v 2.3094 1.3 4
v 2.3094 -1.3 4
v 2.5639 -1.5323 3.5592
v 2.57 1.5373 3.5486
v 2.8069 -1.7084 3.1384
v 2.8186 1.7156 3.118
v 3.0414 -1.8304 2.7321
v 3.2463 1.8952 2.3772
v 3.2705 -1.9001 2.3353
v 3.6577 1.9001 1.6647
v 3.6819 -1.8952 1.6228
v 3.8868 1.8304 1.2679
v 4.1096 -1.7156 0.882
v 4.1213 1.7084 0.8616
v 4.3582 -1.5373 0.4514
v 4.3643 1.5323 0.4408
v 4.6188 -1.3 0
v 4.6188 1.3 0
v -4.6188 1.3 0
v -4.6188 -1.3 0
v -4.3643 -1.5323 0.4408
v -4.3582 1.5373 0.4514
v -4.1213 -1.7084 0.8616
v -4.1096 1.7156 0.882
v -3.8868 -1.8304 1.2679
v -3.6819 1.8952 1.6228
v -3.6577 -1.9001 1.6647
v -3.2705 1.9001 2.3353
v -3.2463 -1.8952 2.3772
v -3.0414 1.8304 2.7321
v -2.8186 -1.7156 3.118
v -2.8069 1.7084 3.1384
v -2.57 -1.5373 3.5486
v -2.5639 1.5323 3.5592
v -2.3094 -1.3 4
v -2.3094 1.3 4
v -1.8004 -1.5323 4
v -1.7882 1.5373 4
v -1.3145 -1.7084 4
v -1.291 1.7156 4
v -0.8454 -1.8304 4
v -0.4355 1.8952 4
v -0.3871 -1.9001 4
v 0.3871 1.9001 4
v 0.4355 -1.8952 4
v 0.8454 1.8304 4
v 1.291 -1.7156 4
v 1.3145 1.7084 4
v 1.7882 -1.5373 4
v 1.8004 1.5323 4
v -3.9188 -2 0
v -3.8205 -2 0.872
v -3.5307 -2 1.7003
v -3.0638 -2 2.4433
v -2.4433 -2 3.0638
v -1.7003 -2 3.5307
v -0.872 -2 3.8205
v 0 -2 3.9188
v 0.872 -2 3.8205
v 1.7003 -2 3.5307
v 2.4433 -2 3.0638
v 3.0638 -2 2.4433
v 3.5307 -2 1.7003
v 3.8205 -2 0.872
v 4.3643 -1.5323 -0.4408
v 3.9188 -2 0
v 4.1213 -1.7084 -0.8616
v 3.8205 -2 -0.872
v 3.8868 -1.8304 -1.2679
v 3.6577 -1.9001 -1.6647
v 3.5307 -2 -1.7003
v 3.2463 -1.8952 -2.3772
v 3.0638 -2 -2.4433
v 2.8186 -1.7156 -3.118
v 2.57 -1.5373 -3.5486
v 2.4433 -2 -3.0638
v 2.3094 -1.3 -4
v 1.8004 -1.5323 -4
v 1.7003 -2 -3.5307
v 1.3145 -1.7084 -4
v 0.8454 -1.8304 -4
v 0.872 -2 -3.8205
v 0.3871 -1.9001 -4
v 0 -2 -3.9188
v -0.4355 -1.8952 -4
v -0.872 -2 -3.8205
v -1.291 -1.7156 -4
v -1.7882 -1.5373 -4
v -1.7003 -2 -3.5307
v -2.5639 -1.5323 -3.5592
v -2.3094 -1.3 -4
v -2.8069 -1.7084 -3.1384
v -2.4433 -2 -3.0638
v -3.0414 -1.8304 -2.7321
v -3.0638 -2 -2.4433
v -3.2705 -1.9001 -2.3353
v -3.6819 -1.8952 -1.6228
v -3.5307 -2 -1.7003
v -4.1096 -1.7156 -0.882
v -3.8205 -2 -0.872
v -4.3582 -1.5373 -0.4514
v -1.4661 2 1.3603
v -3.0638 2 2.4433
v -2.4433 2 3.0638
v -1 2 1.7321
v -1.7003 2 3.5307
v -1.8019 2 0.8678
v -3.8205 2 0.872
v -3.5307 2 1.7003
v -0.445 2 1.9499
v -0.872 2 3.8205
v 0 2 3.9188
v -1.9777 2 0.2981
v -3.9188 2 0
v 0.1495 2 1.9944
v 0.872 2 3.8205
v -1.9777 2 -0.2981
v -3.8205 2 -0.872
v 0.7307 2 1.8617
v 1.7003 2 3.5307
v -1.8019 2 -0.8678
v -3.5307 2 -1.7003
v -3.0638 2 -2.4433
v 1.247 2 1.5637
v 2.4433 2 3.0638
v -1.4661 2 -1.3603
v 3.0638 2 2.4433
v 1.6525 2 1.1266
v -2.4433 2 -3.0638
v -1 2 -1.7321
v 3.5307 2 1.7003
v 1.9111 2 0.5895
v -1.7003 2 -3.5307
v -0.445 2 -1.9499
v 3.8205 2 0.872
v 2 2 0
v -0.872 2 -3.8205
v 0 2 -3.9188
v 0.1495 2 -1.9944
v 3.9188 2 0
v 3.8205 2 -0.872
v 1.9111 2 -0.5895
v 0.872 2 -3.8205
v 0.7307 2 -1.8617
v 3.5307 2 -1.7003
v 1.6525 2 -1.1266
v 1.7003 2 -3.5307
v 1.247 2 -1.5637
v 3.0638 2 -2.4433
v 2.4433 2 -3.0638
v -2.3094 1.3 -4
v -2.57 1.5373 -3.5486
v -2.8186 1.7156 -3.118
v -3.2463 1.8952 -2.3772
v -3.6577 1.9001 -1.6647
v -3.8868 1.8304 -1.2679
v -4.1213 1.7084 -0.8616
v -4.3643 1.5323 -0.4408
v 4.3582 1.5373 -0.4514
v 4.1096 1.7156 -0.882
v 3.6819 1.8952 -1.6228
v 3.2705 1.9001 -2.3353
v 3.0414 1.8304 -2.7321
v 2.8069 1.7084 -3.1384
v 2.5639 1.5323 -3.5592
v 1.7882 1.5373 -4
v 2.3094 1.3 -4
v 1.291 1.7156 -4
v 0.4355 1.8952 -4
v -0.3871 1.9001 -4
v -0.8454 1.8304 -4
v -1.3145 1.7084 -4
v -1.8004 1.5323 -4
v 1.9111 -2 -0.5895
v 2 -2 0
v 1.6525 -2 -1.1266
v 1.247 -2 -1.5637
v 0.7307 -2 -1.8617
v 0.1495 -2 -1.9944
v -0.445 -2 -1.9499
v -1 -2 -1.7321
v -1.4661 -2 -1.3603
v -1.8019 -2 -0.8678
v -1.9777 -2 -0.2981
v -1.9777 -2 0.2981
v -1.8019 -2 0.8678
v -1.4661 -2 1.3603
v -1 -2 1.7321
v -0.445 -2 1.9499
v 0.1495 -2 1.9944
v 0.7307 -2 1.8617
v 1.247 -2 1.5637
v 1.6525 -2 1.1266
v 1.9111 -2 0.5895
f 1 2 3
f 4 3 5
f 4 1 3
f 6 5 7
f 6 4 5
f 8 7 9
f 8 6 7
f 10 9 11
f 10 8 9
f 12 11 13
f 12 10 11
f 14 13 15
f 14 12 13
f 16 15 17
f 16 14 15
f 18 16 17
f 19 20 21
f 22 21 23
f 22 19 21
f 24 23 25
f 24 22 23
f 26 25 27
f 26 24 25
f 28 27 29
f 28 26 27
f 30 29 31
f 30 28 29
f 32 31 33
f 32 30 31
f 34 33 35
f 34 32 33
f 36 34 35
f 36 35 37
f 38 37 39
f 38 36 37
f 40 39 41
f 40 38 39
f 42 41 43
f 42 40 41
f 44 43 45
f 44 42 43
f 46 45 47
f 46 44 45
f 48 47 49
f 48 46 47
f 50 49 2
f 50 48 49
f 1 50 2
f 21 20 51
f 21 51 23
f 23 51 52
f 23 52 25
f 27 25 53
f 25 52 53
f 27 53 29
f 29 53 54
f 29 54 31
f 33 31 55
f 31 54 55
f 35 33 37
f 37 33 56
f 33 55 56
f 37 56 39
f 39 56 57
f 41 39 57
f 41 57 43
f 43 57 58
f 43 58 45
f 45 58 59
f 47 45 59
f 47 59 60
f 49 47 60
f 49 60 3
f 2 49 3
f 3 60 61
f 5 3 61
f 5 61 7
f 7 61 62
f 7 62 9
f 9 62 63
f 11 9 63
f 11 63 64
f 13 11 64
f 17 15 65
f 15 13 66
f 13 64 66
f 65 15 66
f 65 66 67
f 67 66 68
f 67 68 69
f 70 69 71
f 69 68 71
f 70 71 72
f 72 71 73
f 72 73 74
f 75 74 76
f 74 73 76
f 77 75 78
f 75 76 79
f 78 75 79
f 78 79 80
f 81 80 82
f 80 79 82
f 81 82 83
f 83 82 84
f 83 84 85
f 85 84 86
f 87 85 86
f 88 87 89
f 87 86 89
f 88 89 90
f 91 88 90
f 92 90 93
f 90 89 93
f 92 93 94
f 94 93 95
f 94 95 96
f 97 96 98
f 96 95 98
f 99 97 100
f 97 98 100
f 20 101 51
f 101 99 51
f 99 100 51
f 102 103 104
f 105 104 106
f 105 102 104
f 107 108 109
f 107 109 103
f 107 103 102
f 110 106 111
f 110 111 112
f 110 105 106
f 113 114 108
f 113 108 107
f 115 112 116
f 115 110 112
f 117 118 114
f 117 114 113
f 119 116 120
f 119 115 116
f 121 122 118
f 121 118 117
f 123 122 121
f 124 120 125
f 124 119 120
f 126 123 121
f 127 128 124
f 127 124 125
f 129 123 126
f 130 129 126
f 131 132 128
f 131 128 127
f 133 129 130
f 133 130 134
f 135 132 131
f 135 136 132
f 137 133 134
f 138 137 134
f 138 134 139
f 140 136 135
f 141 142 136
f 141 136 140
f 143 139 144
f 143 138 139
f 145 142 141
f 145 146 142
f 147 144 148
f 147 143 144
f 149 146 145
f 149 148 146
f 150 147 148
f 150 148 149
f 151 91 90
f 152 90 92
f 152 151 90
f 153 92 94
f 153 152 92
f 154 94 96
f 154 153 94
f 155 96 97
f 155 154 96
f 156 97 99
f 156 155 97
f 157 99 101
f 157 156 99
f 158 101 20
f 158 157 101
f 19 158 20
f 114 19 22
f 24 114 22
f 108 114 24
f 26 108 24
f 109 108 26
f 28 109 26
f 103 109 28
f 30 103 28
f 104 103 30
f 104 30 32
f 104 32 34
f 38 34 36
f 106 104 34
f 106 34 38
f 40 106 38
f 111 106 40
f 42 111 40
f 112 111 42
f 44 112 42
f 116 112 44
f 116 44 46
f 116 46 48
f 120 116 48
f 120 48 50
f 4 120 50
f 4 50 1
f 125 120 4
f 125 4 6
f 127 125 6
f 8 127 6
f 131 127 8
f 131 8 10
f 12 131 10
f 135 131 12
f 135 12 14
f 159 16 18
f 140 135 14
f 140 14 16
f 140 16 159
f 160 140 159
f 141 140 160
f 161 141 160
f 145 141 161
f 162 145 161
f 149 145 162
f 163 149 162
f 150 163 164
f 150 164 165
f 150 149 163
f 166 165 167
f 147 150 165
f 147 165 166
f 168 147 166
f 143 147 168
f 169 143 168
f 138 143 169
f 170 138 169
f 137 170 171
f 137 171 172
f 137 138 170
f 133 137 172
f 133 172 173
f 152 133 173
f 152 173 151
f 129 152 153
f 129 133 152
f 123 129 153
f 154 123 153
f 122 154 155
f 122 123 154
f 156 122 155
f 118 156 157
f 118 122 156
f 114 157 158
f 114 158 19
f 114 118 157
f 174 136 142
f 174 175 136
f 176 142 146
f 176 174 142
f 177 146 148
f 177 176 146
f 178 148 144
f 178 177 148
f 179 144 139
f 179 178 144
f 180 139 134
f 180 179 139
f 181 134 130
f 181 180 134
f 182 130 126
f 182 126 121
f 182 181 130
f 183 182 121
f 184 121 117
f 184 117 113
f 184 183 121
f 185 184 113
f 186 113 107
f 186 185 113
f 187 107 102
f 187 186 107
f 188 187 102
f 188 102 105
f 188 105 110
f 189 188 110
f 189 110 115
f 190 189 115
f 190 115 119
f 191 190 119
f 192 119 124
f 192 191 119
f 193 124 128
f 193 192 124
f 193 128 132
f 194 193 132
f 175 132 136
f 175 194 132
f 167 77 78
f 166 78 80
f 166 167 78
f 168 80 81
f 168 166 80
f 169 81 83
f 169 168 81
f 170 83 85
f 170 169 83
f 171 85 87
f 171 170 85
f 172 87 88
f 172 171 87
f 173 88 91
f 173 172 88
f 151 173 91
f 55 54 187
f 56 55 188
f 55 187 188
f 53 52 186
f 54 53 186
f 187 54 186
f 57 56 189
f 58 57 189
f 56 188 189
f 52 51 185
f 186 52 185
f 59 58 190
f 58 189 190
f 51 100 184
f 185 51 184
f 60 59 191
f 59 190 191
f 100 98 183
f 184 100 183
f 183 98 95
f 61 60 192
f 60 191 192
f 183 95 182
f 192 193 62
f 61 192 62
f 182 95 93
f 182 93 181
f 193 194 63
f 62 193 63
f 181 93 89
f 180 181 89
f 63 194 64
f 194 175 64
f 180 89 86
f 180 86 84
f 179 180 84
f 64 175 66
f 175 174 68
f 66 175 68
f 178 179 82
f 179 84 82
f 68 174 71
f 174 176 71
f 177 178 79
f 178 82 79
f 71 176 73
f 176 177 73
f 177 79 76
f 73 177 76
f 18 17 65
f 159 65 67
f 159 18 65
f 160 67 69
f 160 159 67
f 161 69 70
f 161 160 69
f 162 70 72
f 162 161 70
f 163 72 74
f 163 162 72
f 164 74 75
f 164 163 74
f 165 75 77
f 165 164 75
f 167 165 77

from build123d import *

# Parameters (mm, degrees)
SKETCH1_R           = 2
BOSS_EXTRUDE1_DEPTH = 2


with BuildPart() as part:
    # Sketch1 → Boss-Extrude1 (new body, symmetric)
    with BuildSketch(Plane(origin=(0, 0, 0), x_dir=(1, 0, 0), z_dir=(0, 1, 0))):
        Polygon((2.309401077, 4), (-2.309401077, 4), (-4.618802154, 0), (-2.309401077, -4), (2.309401077, -4), (4.618802154, 0), align=None)
        Circle(SKETCH1_R, mode=Mode.SUBTRACT)
    extrude(amount=BOSS_EXTRUDE1_DEPTH, both=True)

    # Sketch2 → Cut-Revolve1 (revolve, cut)
    with BuildSketch(Plane.XY):
        Polygon((-4.618802154, 1.3), (-3.918802154, 2), (-4.618802154, 2), align=None)
    cut_revolve1 = revolve(axis=Axis((0, 0, 0), (0, 1, 0)), mode=Mode.SUBTRACT)

    # Mirror1: Cut-Revolve1 across plane
    add(cut_revolve1.mirror(Plane.ZX), mode=Mode.SUBTRACT)


solid = part.part
